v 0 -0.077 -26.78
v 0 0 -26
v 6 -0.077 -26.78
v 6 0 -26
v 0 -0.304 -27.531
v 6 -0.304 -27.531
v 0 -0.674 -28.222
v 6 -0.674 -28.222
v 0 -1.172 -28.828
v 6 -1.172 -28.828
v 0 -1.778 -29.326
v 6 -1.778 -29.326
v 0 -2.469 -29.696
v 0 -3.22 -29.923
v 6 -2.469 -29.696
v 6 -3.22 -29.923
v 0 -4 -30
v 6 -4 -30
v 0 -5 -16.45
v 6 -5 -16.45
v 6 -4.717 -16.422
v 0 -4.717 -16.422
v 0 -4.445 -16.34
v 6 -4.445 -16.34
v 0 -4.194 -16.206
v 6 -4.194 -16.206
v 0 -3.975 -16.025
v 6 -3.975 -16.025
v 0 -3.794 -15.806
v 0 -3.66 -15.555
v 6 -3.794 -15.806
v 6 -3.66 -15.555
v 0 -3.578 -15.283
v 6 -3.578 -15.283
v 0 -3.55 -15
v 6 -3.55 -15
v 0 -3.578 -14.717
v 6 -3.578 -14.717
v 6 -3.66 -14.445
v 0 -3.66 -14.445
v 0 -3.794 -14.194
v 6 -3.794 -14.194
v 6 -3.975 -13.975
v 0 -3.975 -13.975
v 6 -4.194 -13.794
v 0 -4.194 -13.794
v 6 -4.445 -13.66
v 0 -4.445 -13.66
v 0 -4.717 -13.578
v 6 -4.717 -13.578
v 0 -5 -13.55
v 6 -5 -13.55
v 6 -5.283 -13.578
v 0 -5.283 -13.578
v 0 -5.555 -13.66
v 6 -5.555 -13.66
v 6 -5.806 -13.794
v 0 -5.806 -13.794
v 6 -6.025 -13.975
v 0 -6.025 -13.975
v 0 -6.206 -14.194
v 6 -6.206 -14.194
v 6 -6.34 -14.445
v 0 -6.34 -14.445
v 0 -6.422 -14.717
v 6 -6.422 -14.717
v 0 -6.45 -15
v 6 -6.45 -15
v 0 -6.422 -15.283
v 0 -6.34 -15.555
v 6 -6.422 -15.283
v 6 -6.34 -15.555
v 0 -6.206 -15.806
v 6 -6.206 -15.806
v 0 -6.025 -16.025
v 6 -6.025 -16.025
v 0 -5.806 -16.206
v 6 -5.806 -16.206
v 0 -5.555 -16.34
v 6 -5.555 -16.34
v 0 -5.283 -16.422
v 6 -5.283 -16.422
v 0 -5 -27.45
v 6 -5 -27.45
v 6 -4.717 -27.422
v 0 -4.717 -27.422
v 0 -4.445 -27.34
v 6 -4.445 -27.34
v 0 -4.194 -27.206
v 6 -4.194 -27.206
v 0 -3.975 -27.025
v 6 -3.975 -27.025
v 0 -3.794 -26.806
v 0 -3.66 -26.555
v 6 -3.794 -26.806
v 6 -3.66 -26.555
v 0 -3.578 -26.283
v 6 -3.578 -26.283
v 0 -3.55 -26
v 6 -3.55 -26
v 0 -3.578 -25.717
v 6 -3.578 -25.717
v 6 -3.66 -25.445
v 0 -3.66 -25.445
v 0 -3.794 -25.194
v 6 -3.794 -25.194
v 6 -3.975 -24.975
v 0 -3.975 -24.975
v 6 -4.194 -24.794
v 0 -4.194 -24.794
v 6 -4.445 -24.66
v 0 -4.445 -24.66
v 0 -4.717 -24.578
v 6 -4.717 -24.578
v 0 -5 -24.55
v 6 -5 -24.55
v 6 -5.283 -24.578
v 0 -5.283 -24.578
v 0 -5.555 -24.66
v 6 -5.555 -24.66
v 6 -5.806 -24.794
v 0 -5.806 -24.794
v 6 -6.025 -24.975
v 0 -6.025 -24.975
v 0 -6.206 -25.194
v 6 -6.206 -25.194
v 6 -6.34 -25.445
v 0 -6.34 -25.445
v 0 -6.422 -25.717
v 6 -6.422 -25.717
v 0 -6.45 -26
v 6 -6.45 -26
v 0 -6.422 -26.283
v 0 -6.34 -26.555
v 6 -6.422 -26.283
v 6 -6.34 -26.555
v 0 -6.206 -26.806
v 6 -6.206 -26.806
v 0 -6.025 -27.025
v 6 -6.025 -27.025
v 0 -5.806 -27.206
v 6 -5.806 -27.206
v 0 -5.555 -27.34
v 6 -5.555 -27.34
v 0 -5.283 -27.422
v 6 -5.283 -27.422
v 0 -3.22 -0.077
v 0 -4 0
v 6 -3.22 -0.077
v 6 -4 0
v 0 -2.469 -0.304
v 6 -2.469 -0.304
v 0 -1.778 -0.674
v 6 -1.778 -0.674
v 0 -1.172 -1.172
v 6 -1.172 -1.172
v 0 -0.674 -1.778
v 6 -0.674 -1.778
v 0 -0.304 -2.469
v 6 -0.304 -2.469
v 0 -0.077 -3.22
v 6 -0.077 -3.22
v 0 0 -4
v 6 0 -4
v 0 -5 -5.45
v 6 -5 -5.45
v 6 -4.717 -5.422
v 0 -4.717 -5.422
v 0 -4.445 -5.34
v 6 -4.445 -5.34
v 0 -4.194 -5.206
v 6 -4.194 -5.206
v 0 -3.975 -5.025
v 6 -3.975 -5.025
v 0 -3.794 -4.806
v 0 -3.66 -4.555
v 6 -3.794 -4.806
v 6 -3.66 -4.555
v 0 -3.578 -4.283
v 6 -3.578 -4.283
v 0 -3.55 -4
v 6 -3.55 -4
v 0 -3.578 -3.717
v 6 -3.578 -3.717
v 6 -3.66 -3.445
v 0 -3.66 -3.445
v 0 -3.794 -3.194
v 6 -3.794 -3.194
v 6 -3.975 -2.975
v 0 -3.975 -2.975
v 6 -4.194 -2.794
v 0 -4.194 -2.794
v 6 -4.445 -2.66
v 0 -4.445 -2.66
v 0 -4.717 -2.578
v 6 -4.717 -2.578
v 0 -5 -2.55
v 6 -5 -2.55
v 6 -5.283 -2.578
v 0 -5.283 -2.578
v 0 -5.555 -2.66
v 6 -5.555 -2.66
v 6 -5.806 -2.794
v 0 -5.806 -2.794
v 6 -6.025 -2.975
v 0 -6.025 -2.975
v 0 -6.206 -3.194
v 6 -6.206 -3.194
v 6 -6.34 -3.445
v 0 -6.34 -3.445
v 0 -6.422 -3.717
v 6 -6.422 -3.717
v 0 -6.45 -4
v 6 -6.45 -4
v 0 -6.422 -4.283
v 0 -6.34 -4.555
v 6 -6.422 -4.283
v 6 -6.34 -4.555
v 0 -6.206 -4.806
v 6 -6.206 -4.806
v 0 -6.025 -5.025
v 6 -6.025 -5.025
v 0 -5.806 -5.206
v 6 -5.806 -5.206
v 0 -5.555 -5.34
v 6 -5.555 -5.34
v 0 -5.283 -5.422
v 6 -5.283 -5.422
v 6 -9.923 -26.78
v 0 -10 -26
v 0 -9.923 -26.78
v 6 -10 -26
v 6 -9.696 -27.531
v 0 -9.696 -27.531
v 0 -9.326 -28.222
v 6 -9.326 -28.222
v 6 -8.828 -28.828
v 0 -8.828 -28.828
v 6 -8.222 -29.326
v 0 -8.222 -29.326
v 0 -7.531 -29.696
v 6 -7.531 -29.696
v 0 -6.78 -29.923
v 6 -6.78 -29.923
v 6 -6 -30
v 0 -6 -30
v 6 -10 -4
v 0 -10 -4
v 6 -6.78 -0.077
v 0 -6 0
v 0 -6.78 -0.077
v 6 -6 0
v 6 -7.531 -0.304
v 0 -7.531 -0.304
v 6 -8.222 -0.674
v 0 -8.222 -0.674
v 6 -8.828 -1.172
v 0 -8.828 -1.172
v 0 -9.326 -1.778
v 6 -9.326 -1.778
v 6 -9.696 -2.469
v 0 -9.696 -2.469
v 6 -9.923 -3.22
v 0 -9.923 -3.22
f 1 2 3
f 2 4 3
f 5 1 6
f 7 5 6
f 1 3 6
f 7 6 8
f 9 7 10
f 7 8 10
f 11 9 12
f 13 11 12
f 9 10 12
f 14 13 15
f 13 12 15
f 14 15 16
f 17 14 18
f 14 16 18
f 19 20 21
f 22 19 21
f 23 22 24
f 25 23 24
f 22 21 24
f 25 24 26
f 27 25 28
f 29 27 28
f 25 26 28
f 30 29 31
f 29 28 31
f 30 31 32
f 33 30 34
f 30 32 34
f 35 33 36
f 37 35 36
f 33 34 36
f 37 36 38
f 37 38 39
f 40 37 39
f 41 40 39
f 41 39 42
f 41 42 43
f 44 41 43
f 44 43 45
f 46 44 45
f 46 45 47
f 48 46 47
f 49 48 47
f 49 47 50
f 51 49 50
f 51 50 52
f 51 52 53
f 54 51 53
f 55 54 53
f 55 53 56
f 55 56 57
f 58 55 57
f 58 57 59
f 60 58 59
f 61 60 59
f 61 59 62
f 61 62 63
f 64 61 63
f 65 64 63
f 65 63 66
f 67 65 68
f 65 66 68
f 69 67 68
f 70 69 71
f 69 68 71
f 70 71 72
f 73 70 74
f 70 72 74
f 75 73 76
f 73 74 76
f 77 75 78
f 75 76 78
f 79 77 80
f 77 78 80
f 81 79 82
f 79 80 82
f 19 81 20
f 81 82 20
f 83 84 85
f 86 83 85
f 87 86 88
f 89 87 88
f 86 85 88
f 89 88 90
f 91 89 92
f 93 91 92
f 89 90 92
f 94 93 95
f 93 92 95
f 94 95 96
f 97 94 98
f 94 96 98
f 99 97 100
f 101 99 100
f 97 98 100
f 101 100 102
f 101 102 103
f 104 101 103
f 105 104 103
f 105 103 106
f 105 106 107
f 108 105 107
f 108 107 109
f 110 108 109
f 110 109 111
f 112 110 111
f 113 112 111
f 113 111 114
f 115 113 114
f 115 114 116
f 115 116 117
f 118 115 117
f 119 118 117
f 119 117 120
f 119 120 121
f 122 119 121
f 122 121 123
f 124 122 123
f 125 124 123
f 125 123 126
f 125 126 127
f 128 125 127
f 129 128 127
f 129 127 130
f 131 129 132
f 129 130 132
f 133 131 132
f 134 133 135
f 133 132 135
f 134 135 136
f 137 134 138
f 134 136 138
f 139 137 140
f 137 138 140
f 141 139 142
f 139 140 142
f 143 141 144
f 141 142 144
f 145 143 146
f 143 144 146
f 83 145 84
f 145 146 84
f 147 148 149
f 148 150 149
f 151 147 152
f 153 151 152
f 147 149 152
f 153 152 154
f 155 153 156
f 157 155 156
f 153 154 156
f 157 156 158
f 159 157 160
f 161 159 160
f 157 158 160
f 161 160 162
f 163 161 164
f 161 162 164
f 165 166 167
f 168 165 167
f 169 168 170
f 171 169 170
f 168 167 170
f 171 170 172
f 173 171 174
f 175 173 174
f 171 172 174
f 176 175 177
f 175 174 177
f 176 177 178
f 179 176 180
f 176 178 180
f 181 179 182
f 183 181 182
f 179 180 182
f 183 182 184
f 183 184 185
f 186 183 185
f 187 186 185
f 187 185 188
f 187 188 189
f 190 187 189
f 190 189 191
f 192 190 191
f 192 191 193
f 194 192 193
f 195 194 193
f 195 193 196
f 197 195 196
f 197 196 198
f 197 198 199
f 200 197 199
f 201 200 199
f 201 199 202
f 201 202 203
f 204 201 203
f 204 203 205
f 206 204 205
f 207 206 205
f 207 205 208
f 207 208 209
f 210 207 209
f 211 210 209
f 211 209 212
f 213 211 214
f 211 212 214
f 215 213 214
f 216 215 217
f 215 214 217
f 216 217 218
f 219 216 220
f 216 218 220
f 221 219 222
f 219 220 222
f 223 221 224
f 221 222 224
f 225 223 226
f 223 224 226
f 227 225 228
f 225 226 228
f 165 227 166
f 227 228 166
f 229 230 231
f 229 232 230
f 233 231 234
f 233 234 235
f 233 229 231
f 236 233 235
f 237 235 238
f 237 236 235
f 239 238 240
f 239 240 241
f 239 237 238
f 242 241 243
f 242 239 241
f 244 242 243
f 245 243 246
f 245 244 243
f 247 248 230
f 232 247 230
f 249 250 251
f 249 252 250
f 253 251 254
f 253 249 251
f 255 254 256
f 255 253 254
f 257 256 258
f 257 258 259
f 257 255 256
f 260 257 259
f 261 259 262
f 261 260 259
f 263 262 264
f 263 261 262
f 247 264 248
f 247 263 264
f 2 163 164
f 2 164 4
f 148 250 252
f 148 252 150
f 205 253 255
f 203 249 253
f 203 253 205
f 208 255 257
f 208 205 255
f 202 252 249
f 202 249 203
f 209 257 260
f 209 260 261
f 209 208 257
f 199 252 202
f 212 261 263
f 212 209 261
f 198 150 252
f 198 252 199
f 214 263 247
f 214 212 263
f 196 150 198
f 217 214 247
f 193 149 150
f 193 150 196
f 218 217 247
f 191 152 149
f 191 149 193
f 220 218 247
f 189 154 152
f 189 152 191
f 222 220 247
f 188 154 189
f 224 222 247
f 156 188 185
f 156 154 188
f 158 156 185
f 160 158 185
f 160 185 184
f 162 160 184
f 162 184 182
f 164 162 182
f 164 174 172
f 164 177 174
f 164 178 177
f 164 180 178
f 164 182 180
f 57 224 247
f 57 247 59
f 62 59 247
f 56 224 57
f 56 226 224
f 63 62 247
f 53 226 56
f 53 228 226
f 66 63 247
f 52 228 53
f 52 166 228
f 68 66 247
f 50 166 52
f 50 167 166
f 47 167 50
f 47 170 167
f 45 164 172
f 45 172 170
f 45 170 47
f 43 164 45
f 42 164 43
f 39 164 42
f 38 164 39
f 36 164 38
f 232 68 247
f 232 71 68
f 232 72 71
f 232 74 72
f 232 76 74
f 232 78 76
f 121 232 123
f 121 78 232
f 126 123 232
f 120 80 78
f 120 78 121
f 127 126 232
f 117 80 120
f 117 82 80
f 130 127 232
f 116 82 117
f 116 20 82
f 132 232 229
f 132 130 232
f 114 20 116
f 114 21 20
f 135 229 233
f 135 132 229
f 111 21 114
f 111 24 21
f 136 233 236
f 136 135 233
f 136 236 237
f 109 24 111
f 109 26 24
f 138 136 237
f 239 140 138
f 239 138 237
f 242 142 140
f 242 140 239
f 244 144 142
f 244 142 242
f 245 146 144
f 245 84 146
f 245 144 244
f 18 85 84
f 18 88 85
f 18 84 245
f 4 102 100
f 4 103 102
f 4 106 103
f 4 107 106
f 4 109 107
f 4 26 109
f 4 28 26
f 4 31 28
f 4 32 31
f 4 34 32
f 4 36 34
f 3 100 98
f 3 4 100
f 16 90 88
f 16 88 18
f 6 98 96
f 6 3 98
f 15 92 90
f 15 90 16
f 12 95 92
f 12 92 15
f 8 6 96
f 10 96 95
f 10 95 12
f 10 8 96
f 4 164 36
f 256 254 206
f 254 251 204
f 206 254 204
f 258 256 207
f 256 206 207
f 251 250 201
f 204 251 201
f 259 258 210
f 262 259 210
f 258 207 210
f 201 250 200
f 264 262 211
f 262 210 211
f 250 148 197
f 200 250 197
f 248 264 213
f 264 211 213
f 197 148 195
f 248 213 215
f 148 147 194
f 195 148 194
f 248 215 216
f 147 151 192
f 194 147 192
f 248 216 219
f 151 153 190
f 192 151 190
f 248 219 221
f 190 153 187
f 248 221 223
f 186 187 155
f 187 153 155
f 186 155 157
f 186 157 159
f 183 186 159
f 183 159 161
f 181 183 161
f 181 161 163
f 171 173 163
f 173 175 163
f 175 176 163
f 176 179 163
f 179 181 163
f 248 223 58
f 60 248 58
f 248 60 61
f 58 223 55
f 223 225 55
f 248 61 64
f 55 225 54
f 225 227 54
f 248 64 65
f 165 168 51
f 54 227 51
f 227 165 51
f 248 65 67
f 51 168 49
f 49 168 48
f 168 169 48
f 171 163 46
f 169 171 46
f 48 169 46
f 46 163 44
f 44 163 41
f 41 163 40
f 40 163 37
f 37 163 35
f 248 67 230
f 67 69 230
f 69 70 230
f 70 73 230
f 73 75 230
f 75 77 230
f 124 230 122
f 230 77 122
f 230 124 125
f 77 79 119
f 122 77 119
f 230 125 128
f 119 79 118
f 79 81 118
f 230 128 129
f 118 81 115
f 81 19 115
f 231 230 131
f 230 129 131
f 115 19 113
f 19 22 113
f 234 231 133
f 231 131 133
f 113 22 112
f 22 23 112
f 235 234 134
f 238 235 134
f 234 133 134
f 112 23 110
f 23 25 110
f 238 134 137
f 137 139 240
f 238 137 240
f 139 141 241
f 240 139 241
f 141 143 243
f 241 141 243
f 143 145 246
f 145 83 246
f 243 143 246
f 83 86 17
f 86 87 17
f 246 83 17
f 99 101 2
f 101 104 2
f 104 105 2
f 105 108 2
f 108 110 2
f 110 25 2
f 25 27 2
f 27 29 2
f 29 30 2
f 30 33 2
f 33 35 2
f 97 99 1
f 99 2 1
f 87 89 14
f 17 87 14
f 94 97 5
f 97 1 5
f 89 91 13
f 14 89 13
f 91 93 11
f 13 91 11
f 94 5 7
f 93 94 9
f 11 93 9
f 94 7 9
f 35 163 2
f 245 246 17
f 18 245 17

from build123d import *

# Parameters (mm, degrees)
SKETCH1_W           = 30
SKETCH1_H           = 10
BOSS_EXTRUDE1_DEPTH = 6
SKETCH2_R           = 1.45
CUT_EXTRUDE1_DEPTH  = 33.186953879
FILLET1_R           = 4


with BuildPart() as part:
    # Sketch1 → Boss-Extrude1 (new body)
    with BuildSketch(Plane(origin=(0, 0, 0), x_dir=(0, 0, -1), z_dir=(1, 0, 0))):
        with Locations((15, -5)):
            Rectangle(SKETCH1_W, SKETCH1_H)
    extrude(amount=BOSS_EXTRUDE1_DEPTH)

    # Sketch2 → Cut-Extrude1 (cut, through all)
    with BuildSketch(Plane(origin=(6, 0, 0), x_dir=(0, 0, -1), z_dir=(1, 0, 0))):
        with Locations((4, -5)):
            Circle(SKETCH2_R)
        with Locations((15, -5)):
            Circle(SKETCH2_R)
        with Locations((26, -5)):
            Circle(SKETCH2_R)
    extrude(amount=-CUT_EXTRUDE1_DEPTH, mode=Mode.SUBTRACT)

    # Fillet1
    fillet1_edges = [part.edges().sort_by_distance(p)[0] for p in [
        (3, 0, 0),
        (3, 0, -30),
        (3, -10, -30),
        (3, -10, 0),
    ]]
    fillet(fillet1_edges, radius=FILLET1_R)


solid = part.part
